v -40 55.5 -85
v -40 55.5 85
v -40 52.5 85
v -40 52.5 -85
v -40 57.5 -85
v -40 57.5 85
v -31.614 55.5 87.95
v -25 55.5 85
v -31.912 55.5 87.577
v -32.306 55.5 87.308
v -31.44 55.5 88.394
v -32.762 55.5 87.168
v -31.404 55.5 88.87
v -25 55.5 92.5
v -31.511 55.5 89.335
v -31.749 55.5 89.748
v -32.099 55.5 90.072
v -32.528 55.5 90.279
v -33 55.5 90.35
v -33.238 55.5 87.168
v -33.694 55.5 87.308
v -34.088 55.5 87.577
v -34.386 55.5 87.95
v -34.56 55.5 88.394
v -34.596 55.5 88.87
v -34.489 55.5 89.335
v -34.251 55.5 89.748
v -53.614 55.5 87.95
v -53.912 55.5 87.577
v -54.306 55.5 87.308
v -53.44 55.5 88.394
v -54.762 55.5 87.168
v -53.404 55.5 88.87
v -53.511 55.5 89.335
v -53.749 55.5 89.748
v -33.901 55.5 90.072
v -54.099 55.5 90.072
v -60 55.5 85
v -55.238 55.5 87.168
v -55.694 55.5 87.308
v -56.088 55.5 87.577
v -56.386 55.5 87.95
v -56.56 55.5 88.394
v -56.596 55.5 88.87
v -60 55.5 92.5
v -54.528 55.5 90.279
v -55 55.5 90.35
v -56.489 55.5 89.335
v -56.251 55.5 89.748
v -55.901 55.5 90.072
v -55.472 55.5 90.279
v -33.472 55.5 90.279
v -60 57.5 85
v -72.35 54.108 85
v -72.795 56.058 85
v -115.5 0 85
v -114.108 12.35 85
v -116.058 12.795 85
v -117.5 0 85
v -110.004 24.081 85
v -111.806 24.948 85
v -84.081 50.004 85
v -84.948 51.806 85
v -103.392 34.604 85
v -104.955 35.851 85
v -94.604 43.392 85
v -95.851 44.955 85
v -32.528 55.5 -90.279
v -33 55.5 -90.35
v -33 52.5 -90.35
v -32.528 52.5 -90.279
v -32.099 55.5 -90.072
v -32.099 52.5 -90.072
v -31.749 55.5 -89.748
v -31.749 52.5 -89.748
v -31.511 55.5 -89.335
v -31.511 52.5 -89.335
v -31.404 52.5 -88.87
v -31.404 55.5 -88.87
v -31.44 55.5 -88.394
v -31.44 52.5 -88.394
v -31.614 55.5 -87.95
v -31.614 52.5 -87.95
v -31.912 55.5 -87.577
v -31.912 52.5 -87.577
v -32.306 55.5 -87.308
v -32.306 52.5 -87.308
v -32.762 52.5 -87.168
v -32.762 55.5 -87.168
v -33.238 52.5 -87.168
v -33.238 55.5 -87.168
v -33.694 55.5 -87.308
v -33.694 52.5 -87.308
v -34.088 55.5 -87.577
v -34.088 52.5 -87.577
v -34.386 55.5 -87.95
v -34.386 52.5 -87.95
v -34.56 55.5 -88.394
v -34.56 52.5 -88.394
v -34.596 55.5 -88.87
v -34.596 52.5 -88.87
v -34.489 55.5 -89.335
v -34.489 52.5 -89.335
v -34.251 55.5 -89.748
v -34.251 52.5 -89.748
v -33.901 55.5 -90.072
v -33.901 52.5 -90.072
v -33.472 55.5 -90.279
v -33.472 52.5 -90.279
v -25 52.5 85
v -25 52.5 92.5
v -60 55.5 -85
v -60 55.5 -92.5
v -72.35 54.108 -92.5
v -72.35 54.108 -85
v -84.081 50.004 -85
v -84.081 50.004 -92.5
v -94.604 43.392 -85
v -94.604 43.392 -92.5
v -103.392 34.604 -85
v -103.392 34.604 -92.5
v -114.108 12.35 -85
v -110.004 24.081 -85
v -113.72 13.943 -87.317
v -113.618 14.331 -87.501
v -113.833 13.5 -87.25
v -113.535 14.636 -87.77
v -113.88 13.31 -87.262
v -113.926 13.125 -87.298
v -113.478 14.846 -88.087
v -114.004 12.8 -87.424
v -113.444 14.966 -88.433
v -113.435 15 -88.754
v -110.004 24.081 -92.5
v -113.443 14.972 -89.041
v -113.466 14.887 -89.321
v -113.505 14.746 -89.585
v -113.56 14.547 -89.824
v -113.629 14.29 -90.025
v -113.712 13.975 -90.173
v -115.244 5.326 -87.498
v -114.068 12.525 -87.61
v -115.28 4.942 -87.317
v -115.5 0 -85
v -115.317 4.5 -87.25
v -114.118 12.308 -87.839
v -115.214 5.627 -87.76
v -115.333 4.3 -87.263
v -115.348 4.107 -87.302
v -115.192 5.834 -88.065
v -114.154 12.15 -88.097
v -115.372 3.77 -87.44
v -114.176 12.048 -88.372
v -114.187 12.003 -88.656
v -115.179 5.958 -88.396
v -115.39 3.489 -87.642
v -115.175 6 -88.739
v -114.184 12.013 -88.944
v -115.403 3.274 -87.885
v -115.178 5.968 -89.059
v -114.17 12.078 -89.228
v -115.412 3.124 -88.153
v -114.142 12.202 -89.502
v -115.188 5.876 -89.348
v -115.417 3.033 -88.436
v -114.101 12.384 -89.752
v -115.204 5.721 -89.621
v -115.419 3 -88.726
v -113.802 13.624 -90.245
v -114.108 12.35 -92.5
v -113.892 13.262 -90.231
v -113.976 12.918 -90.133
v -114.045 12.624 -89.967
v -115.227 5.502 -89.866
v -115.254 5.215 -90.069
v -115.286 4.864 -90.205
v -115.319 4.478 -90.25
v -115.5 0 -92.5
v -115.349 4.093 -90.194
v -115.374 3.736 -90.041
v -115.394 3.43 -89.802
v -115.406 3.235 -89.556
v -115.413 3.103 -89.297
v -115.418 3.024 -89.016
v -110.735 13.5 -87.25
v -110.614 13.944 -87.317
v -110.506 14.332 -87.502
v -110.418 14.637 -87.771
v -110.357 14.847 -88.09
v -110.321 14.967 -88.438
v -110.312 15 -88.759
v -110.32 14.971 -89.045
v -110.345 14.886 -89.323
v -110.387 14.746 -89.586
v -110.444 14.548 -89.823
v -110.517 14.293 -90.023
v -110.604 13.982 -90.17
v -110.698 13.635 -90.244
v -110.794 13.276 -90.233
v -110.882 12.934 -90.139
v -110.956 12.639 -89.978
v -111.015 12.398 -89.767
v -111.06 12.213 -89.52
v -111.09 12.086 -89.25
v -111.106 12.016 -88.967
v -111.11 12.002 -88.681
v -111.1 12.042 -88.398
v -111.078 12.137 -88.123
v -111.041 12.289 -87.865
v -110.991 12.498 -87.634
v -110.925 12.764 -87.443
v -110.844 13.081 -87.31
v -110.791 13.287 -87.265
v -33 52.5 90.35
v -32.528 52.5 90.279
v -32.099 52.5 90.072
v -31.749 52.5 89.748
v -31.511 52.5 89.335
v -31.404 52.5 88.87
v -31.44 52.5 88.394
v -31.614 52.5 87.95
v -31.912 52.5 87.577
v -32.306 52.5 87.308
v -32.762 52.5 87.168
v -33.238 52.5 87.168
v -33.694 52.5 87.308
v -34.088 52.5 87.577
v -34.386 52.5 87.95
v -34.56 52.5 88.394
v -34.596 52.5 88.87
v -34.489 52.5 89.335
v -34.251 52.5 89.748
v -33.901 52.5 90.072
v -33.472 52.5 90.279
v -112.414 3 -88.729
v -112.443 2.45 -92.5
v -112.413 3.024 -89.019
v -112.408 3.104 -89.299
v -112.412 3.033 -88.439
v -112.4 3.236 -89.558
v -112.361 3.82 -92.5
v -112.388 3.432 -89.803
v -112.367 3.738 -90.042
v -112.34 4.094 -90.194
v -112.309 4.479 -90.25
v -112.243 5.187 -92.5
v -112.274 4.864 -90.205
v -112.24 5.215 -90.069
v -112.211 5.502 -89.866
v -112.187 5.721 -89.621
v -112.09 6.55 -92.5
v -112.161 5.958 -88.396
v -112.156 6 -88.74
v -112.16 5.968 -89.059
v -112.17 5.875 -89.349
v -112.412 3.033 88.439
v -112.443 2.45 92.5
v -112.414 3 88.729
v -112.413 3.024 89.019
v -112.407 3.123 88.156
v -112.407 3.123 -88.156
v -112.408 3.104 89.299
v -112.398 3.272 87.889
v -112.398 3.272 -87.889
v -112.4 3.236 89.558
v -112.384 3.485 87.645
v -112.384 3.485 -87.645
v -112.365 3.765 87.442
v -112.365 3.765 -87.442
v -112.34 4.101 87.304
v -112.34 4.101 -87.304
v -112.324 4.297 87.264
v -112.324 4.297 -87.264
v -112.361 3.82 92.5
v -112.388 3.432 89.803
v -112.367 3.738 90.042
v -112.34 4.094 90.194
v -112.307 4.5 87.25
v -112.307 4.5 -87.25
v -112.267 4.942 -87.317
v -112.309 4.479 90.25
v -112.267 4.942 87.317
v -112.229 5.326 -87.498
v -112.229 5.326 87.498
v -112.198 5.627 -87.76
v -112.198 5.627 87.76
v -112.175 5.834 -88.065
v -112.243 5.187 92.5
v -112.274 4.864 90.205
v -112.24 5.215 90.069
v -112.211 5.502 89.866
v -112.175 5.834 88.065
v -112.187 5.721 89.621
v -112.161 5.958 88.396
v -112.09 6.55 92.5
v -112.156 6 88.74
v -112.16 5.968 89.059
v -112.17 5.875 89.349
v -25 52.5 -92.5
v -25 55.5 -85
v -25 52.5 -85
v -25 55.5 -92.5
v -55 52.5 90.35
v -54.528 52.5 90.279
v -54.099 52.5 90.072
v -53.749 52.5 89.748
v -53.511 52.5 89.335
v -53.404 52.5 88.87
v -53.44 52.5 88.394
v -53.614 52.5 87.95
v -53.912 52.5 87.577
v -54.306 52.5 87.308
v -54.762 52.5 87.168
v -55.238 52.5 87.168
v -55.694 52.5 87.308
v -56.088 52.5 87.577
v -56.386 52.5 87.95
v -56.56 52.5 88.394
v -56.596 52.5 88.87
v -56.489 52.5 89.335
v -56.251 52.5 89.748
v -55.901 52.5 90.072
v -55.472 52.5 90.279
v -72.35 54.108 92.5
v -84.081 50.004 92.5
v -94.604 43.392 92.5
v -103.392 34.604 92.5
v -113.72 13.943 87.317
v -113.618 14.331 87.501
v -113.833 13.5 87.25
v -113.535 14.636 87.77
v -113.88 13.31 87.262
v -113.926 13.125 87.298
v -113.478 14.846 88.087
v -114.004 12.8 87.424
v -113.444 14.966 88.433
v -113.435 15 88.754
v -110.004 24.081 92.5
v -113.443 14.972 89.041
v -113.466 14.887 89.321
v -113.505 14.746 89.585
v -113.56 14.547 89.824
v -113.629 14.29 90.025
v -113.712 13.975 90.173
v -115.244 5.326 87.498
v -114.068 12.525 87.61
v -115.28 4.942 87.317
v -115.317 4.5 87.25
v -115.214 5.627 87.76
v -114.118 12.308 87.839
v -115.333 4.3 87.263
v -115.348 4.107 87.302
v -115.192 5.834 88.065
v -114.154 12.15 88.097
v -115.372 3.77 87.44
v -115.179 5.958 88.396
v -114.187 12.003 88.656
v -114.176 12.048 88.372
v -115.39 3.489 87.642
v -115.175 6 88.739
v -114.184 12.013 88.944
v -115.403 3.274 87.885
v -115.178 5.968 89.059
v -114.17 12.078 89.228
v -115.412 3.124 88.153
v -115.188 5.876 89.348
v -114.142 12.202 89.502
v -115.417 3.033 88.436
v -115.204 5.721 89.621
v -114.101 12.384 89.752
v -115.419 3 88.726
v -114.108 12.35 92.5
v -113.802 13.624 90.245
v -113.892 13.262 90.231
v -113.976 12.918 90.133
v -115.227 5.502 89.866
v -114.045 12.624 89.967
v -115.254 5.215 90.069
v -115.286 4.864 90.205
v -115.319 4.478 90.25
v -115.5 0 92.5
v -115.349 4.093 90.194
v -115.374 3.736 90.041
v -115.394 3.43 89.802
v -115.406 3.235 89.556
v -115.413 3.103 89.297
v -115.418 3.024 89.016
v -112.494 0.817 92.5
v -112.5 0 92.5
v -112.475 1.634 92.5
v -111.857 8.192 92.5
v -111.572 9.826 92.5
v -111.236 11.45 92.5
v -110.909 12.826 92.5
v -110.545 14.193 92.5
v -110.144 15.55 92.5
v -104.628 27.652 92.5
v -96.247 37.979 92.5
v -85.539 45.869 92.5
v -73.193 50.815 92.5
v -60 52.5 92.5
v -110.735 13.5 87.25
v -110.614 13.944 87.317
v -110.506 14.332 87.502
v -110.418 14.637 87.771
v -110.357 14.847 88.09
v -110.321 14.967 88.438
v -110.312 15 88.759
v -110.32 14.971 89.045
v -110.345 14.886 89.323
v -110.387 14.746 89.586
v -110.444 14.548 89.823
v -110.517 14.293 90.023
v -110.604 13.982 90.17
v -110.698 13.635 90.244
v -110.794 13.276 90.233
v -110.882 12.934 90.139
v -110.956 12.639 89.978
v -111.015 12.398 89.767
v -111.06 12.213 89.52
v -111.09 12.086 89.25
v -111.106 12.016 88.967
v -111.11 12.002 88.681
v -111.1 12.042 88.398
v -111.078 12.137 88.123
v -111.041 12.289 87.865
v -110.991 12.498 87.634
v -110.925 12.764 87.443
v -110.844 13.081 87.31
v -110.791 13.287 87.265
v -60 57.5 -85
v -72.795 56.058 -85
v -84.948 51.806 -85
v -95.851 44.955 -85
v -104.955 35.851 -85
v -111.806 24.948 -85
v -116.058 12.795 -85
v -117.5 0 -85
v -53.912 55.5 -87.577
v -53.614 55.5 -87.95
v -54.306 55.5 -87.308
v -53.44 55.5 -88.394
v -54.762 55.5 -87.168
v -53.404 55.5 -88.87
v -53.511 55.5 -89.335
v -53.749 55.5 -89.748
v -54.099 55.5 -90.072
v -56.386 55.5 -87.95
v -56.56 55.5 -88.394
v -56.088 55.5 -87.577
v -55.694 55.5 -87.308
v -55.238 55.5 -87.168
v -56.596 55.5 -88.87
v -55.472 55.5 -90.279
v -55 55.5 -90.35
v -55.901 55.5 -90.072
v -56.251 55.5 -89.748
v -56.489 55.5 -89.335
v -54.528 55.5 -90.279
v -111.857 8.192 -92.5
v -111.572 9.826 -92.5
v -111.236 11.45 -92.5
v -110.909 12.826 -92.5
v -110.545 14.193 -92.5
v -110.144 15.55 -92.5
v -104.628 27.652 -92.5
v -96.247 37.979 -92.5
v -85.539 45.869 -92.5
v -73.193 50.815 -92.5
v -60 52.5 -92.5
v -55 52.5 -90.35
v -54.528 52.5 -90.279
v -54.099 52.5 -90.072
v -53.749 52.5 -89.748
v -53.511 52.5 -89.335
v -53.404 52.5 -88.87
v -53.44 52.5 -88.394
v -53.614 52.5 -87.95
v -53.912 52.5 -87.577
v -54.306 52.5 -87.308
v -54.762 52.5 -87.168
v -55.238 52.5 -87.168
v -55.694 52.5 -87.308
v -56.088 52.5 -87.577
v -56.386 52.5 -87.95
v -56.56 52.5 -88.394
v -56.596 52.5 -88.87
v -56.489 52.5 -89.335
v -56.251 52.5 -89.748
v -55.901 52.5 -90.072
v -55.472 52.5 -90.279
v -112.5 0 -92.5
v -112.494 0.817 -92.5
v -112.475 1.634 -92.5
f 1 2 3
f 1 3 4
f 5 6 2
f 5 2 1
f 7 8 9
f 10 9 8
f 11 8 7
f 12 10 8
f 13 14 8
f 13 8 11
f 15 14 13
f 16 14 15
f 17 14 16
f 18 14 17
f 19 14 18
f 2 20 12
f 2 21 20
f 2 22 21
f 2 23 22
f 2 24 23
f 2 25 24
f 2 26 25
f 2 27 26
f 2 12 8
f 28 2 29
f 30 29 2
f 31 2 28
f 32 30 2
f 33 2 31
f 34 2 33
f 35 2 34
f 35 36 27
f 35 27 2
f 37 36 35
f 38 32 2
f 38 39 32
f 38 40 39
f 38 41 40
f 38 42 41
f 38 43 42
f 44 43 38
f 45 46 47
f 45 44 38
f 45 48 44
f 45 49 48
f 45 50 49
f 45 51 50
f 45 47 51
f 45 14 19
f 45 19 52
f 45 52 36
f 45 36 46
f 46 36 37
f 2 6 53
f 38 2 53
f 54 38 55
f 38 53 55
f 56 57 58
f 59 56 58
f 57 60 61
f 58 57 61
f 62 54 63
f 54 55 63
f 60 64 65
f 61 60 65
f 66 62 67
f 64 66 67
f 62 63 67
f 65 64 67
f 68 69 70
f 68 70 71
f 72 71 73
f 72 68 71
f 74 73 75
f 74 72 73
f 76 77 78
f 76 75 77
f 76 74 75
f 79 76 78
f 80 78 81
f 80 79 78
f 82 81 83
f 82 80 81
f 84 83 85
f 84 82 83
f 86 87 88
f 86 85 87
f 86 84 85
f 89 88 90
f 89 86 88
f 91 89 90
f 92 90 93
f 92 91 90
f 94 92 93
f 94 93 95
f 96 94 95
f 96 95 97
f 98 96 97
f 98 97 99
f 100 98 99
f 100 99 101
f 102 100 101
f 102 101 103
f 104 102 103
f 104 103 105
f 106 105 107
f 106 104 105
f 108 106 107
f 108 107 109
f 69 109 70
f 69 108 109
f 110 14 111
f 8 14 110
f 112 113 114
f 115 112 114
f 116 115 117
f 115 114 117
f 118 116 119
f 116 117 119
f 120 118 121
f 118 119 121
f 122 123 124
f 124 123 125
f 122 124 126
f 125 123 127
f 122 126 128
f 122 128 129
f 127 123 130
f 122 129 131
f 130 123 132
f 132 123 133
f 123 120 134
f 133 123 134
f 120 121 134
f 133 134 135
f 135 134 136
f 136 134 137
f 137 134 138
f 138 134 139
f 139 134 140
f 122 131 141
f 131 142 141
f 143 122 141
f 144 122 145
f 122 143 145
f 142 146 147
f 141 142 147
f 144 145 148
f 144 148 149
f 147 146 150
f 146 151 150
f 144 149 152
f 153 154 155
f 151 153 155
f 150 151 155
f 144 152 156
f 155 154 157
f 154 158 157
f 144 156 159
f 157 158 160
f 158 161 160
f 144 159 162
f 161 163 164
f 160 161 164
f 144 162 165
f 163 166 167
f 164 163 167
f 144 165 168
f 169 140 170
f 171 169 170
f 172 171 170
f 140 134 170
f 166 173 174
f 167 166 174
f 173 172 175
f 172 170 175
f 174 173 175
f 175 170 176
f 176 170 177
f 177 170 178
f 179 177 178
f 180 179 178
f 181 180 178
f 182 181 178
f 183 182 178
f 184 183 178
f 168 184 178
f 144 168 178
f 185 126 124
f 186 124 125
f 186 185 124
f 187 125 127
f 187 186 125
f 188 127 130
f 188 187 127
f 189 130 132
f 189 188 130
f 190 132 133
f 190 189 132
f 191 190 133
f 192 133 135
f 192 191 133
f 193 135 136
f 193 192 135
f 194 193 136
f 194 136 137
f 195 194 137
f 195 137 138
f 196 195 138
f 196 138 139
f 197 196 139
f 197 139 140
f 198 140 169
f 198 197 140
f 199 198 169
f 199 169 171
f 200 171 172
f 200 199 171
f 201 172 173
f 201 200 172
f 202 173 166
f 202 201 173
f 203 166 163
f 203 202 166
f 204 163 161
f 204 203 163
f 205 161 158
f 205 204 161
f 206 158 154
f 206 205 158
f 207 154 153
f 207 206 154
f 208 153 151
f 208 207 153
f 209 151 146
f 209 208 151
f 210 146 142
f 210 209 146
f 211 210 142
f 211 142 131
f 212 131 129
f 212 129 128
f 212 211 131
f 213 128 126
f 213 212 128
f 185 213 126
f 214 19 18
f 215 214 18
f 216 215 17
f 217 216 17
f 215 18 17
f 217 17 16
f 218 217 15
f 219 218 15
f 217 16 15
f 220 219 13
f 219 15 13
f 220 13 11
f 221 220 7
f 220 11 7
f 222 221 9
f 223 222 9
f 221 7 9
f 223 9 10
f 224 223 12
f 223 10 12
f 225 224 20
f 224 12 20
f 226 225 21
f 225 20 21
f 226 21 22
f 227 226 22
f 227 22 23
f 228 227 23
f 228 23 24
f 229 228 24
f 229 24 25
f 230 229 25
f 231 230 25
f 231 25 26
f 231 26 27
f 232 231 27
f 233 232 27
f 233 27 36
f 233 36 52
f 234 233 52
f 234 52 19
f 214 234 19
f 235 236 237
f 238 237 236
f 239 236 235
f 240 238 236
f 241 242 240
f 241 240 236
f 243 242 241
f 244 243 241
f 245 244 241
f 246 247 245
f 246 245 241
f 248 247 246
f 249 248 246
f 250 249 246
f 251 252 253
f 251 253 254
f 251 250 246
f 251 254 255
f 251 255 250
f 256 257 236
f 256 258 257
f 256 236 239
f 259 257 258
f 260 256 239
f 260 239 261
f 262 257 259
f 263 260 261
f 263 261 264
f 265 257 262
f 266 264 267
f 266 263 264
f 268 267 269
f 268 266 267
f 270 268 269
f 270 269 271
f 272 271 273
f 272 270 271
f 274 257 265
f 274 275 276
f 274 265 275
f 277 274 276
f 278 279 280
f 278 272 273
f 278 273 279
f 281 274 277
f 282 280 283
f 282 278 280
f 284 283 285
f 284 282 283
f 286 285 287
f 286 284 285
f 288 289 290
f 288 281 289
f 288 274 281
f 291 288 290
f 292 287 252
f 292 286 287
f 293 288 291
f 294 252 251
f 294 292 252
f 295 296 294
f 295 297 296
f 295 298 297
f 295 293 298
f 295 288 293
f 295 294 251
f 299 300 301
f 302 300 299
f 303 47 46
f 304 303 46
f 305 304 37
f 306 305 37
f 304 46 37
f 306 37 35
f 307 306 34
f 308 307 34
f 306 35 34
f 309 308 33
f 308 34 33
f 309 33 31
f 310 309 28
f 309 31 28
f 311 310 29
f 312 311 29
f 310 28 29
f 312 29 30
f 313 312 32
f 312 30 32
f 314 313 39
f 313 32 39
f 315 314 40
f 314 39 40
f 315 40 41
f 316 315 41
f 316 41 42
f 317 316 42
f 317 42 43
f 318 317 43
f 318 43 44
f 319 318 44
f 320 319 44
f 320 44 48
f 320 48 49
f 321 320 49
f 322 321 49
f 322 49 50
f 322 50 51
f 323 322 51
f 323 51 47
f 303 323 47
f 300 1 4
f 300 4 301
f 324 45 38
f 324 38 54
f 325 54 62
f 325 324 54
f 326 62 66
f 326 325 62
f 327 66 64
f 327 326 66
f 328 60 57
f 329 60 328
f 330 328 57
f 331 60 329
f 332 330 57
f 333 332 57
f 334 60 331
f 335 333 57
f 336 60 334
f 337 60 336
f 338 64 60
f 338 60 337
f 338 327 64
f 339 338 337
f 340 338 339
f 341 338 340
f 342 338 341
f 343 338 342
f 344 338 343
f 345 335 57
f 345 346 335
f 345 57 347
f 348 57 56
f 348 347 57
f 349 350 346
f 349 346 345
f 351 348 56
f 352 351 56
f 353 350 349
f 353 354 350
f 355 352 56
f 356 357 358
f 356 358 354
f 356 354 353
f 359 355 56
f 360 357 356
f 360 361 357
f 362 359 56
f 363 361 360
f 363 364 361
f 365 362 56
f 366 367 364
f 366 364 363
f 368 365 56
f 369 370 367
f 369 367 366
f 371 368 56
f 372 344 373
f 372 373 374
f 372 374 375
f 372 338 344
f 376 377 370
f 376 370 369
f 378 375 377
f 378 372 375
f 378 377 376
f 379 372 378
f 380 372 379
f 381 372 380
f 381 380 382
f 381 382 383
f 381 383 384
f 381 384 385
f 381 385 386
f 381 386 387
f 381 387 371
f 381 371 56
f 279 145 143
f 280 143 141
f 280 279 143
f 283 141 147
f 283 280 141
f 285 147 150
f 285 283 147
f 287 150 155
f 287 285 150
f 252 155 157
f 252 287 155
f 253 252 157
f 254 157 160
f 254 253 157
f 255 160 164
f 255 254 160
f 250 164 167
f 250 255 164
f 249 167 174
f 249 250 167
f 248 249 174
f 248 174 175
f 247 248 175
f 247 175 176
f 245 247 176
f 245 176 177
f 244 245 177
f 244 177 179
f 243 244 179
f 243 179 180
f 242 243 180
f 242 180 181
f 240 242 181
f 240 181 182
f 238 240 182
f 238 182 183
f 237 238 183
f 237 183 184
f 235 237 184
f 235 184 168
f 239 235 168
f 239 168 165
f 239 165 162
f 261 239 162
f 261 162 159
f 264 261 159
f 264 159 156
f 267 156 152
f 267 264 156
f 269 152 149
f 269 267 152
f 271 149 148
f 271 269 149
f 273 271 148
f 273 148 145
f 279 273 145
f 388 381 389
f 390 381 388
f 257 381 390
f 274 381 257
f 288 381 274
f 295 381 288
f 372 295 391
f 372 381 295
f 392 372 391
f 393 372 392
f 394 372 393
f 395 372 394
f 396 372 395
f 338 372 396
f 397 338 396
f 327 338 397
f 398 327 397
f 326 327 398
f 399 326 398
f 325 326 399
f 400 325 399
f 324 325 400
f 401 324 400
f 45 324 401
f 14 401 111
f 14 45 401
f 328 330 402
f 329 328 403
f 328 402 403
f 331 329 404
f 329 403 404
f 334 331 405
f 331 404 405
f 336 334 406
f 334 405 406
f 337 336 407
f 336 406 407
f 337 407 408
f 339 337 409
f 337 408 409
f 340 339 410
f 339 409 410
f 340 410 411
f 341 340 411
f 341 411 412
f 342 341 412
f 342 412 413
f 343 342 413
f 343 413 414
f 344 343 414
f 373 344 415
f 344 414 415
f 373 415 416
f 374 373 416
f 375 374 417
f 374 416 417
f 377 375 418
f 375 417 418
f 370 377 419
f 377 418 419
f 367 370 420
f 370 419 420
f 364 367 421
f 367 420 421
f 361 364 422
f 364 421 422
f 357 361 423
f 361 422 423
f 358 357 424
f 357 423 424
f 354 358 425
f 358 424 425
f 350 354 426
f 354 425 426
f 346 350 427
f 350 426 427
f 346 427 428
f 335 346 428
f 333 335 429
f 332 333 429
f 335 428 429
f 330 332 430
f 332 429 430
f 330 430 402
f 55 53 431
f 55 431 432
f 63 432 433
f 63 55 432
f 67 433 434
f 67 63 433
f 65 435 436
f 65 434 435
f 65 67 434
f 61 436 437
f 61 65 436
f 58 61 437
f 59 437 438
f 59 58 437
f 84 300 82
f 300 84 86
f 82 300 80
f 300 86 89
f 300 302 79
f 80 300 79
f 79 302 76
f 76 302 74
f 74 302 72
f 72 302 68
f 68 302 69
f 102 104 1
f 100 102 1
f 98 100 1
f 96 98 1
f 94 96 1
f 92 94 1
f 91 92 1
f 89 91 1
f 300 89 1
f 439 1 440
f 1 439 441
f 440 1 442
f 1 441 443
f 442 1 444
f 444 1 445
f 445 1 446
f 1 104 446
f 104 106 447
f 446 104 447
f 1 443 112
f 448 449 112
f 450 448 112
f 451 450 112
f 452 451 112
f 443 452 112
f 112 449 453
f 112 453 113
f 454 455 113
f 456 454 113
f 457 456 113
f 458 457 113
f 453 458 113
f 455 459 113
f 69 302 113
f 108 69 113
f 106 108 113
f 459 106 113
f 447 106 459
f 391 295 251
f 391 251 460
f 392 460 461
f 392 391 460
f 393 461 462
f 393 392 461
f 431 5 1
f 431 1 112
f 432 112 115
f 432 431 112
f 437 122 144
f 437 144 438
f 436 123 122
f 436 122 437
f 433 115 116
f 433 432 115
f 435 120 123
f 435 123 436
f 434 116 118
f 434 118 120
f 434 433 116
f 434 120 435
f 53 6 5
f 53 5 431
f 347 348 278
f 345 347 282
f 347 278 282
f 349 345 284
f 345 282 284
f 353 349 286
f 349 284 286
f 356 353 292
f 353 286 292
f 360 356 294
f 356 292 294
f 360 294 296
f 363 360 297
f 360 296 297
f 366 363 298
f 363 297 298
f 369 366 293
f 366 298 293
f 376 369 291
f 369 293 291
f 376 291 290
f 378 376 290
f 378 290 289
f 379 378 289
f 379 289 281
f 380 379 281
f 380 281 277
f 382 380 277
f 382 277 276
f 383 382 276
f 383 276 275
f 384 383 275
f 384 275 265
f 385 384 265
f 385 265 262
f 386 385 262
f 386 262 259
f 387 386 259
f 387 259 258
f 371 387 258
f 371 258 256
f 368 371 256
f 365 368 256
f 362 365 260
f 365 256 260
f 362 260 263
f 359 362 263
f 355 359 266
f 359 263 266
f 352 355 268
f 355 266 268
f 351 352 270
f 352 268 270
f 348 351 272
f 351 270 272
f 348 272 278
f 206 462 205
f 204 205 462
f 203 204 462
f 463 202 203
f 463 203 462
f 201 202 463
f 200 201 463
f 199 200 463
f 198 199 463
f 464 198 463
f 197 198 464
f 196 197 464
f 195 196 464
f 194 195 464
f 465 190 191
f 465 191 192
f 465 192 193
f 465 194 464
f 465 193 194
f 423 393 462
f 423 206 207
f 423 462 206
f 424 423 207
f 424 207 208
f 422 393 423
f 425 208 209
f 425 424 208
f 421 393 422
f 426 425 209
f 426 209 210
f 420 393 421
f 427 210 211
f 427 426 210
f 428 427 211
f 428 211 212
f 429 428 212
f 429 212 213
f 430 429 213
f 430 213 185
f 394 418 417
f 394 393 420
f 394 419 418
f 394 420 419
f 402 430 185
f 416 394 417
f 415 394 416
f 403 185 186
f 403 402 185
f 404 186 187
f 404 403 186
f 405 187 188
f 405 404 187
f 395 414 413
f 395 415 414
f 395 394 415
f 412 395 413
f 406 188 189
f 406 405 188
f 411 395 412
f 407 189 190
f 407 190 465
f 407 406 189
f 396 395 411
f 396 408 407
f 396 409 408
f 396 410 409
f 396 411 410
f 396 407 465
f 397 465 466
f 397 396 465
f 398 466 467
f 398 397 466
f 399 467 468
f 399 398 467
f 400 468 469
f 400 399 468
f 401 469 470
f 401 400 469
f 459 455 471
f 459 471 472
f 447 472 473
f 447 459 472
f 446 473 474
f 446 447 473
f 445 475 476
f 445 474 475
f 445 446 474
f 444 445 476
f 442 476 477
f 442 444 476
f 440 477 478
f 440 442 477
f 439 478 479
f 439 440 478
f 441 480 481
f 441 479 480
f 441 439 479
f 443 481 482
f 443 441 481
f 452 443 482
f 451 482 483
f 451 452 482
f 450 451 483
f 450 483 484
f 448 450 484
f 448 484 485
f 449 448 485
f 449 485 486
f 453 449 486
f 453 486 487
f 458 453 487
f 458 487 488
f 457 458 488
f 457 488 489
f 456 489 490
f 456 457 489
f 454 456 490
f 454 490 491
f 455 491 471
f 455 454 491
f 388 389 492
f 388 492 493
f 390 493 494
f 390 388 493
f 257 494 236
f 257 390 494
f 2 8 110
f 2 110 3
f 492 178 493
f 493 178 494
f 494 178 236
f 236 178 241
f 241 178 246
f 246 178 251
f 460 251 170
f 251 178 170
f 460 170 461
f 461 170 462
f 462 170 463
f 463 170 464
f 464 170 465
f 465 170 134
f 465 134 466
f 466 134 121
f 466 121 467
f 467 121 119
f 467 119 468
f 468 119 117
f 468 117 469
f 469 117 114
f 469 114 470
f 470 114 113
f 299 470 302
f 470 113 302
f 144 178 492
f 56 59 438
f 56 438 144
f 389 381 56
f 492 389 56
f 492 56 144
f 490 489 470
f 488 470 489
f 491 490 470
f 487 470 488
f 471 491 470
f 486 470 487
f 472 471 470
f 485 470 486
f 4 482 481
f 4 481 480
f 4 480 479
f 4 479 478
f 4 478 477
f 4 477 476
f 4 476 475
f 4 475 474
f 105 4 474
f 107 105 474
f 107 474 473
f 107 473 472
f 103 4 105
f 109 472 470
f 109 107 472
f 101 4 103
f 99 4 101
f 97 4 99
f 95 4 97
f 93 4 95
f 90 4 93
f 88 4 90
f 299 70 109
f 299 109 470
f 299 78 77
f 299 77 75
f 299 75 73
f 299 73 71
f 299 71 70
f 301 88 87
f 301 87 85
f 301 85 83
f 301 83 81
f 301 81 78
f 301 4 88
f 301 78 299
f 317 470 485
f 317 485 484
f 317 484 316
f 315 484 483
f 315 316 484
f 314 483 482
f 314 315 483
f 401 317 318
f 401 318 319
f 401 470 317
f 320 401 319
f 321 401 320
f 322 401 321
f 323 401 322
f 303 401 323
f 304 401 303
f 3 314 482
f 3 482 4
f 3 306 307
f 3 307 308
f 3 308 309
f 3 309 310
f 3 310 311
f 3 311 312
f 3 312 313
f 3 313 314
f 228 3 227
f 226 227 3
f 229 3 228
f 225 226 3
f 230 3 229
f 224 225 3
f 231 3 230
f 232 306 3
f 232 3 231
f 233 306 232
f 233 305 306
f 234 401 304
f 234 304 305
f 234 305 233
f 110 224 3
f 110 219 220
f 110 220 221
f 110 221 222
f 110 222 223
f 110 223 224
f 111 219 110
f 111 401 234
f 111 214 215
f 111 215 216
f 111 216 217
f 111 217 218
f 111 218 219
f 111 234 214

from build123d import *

# Parameters (mm, degrees)
BOSS_EXTRUDE1_DEPTH = 92.5
SKETCH2_R           = 1.5
CUT_EXTRUDE1_DEPTH  = 161.2146997
SKETCH4_R           = 1.6
CUT_EXTRUDE2_DEPTH  = 161.214699867
CUT_EXTRUDE3_DEPTH  = 7.5
CUT_EXTRUDE5_DEPTH  = 7.5


with BuildPart() as part:
    # Sketch1 → Boss-Extrude1 (new, symmetric)
    with BuildSketch(Plane.XY):
        with BuildLine():
            ThreePointArc((117.5, 0), (100.658639918, 40.658639918), (60, 57.5))
            Line((60, 57.5), (-60, 57.5))
            ThreePointArc((-60, 57.5), (-100.658639918, 40.658639918), (-117.5, 0))
            Line((-117.5, 0), (-112.5, 0))
            ThreePointArc((-112.5, 0), (-112.485698596, 1.22533379), (-112.442802175, 2.45))
            ThreePointArc((-112.442802175, 2.45), (-112.306489538, 4.503460029), (-112.089802265, 6.55))
            ThreePointArc((-112.089802265, 6.55), (-111.721057974, 9.010114432), (-111.236193262, 11.45))
            ThreePointArc((-111.236193262, 11.45), (-110.731665892, 13.511035335), (-110.144266871, 15.55))
            ThreePointArc((-110.144266871, 15.55), (-91.143819612, 42.264790311), (-60, 52.5))
            Line((-60, 52.5), (-57.05, 52.5))
            Line((-57.05, 52.5), (-52.95, 52.5))
            Line((-52.95, 52.5), (-35.05, 52.5))
            Line((-35.05, 52.5), (-30.95, 52.5))
            Line((-30.95, 52.5), (-13.05, 52.5))
            Line((-13.05, 52.5), (-8.95, 52.5))
            Line((-8.95, 52.5), (8.95, 52.5))
            Line((8.95, 52.5), (13.05, 52.5))
            Line((13.05, 52.5), (30.95, 52.5))
            Line((30.95, 52.5), (35.05, 52.5))
            Line((35.05, 52.5), (52.95, 52.5))
            Line((52.95, 52.5), (57.05, 52.5))
            Line((57.05, 52.5), (60, 52.5))
            ThreePointArc((60, 52.5), (91.143819612, 42.264790311), (110.144266871, 15.55))
            ThreePointArc((110.144266871, 15.55), (110.731665892, 13.511035335), (111.236193262, 11.45))
            ThreePointArc((111.236193262, 11.45), (111.721057974, 9.010114432), (112.089802265, 6.55))
            ThreePointArc((112.089802265, 6.55), (112.306489538, 4.503460029), (112.442802175, 2.45))
            ThreePointArc((112.442802175, 2.45), (112.485698596, 1.22533379), (112.5, 0))
            Line((112.5, 0), (117.5, 0))
        make_face()
    extrude(amount=BOSS_EXTRUDE1_DEPTH, both=True)

    # Sketch2 → Cut-Extrude1 (cut, symmetric)
    with BuildSketch(Plane(origin=(0, 0, 0), x_dir=(0, 0, -1), z_dir=(1, 0, 0))):
        with Locations((-88.75, 4.5)):
            Circle(SKETCH2_R)
        with Locations((-88.75, 13.5)):
            Circle(SKETCH2_R)
    cut_extrude1 = extrude(amount=CUT_EXTRUDE1_DEPTH, both=True, mode=Mode.SUBTRACT)

    # Sketch4 → Cut-Extrude2 (cut, symmetric)
    with BuildSketch(Plane(origin=(0, 57.5, 0), x_dir=(1, 0, 0), z_dir=(0, 1, 0))):
        with Locations(Location((-55, -88.75, 0), (0, 0, 270))):
            Circle(SKETCH4_R)
        with Locations(Location((-33, -88.75, 0), (0, 0, 270))):
            Circle(SKETCH4_R)
        with Locations(Location((-11, -88.75, 0), (0, 0, 270))):
            Circle(SKETCH4_R)
        with Locations(Location((11, -88.75, 0), (0, 0, 270))):
            Circle(SKETCH4_R)
        with Locations(Location((33, -88.75, 0), (0, 0, 270))):
            Circle(SKETCH4_R)
        with Locations(Location((55, -88.75, 0), (0, 0, 270))):
            Circle(SKETCH4_R)
    cut_extrude2 = extrude(amount=CUT_EXTRUDE2_DEPTH, both=True, mode=Mode.SUBTRACT)

    # Sketch5 → Cut-Extrude3 (cut)
    with BuildSketch(Plane(origin=(0, 0, -92.5), x_dir=(-1, 0, 0), z_dir=(0, 0, -1))):
        with BuildLine():
            Line((115.5, 0), (117.5, 0))
            ThreePointArc((117.5, 0), (100.658639918, 40.658639918), (60, 57.5))
            Line((60, 57.5), (-60, 57.5))
            ThreePointArc((-60, 57.5), (-100.658639918, 40.658639918), (-117.5, 0))
            Line((-117.5, 0), (-115.5, 0))
            ThreePointArc((-115.5, 0), (-99.244426356, 39.244426356), (-60, 55.5))
            Line((-60, 55.5), (60, 55.5))
            ThreePointArc((60, 55.5), (99.244426356, 39.244426356), (115.5, 0))
        make_face()
    cut_extrude3 = extrude(amount=-CUT_EXTRUDE3_DEPTH, mode=Mode.SUBTRACT)

    # Mirror1: Cut-Extrude1, Cut-Extrude2, Cut-Extrude3 across plane
    add(cut_extrude1.mirror(Plane.XY), mode=Mode.SUBTRACT)
    add(cut_extrude2.mirror(Plane.XY), mode=Mode.SUBTRACT)
    add(cut_extrude3.mirror(Plane.XY), mode=Mode.SUBTRACT)

    # Sketch6 → Cut-Extrude5 (cut)
    with BuildSketch(Plane(origin=(0, 57.5, 0), x_dir=(1, 0, 0), z_dir=(0, 1, 0))):
        Polygon((-40, 85), (-25, 85), (-25, 92.5), (25, 92.5), (25, 85), (40, 85), (40, -85), (25, -85), (25, -92.5), (-25, -92.5), (-25, -85), (-40, -85), align=None)
    extrude(amount=-CUT_EXTRUDE5_DEPTH, mode=Mode.SUBTRACT)


with BuildPart() as body_2:
    # of the pieces the cut leaves, the one that is kept (cut_extrude5_keep)
    add(part.part.solids().sort_by_distance((-25, 55.5, -92.5))[0])


solid = body_2.part
